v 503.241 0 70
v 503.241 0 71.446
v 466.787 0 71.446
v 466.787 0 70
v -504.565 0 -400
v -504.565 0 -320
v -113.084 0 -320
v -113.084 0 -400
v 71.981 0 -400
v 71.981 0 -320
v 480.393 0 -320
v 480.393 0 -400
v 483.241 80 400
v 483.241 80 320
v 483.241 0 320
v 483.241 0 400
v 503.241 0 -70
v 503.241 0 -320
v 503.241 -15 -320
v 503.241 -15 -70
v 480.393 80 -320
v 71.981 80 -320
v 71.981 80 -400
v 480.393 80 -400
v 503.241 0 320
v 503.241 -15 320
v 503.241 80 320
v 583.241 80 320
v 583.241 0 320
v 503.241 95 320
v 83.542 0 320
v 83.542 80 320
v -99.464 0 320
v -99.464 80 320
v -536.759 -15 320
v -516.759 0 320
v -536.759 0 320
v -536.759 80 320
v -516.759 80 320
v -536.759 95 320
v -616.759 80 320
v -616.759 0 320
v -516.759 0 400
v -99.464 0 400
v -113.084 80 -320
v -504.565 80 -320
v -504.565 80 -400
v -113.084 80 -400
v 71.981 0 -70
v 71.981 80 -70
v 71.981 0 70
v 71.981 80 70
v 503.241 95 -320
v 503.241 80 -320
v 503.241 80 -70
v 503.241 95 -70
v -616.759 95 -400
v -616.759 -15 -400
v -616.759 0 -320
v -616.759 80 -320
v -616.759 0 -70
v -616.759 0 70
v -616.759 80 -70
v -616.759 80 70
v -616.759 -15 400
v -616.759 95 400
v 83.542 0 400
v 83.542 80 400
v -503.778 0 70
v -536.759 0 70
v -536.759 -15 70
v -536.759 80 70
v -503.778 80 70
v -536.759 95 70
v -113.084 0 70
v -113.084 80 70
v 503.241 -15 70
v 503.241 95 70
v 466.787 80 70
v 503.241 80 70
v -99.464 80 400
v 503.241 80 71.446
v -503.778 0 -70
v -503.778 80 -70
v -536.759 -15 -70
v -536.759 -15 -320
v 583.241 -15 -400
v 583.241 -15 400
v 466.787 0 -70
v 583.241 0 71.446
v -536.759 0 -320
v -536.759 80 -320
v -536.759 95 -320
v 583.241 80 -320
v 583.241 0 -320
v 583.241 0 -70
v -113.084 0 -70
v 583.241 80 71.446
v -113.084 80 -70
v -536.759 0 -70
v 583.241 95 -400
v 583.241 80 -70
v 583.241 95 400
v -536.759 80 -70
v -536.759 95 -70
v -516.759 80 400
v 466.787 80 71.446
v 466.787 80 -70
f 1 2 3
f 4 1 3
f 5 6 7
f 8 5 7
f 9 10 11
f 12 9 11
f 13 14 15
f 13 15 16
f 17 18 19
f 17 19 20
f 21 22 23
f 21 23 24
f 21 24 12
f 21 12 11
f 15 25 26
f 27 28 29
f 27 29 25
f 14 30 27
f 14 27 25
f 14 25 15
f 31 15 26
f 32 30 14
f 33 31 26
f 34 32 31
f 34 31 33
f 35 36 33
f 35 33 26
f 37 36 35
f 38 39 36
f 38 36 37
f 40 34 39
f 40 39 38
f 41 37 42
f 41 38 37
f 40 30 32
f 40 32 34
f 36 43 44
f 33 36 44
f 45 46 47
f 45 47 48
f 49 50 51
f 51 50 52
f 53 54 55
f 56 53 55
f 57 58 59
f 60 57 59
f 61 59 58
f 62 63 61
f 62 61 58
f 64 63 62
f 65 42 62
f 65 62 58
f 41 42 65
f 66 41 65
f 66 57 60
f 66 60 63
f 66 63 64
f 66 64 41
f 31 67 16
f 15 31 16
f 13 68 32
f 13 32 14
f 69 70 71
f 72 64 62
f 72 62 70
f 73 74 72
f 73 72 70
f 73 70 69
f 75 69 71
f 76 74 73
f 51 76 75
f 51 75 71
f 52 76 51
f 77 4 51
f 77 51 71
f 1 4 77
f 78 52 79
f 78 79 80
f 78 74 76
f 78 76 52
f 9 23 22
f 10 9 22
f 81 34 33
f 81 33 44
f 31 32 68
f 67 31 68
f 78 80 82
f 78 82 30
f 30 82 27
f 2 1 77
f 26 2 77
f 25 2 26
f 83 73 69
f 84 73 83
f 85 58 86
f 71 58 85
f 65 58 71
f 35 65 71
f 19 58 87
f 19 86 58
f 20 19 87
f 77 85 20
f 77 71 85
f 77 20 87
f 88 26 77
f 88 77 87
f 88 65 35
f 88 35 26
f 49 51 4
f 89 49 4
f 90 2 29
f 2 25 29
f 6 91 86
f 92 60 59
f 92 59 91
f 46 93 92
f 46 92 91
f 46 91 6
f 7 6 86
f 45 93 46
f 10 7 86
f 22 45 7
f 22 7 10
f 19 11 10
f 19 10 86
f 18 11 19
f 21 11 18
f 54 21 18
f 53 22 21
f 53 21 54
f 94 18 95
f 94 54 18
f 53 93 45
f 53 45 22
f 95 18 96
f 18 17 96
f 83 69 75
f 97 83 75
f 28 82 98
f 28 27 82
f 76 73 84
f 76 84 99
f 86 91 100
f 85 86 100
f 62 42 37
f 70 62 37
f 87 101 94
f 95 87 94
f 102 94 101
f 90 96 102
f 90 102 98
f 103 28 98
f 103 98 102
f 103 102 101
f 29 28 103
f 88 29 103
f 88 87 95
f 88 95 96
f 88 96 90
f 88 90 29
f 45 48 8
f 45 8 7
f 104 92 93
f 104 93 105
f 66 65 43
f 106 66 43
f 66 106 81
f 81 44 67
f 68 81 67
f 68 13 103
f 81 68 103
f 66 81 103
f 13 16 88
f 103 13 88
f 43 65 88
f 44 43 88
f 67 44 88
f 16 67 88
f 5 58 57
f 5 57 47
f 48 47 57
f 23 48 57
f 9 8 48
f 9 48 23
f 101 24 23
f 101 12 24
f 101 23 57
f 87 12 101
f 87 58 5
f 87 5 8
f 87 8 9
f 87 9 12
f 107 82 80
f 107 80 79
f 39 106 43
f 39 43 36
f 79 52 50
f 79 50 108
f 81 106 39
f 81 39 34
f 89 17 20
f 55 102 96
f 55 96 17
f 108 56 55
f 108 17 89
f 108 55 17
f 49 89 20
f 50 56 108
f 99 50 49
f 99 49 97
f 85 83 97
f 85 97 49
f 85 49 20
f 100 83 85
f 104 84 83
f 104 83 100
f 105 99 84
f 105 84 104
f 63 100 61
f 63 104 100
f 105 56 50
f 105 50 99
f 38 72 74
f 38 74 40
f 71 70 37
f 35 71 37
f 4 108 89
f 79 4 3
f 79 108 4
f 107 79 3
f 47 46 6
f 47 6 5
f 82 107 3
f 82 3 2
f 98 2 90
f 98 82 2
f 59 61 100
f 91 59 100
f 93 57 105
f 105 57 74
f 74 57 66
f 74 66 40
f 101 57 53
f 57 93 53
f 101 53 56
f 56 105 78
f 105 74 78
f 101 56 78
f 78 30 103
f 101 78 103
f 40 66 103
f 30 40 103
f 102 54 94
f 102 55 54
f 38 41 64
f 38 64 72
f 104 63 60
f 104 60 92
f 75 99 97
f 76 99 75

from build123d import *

# Parameters (mm, degrees)
F0_W     = 1200
F0_H     = 800
F0_W_2   = 1040
F0_H_2   = 250
F1_DEPTH = 15
F2_W     = 185.065291822
F2_H     = 140
F3_DEPTH = 40
F2_W_2   = 100
F2_H_2   = 80
F2_W_3   = 116.4537014898
F2_H_3   = 141.4459940791
F2_W_4   = 112.9816351
F2_W_5   = 102.8472425875
F2_W_6   = 112.1940789286
F2_W_7   = 183.0065995455
F4_DEPTH = 40


with BuildPart() as f1:
    # F0 (on Front) → F1 (new body)
    with BuildSketch(Plane.XZ):
        with Locations((-16.7594370905, 0)):
            Rectangle(F0_W, F0_H)
        with Locations((-16.7594370905, -195)):
            Rectangle(F0_W_2, F0_H_2, mode=Mode.SUBTRACT)
        with Locations((-16.7594370905, 195)):
            Rectangle(F0_W_2, F0_H_2, mode=Mode.SUBTRACT)
    extrude(amount=F1_DEPTH)

    # F2 (on face) → F3 (join)
    with BuildSketch(Plane(origin=(0, 0, 0), x_dir=(-1, 0, 0), z_dir=(0, 1, 0))):
        with Locations((20.5517672002, 0)):
            Rectangle(F2_W, F2_H)
        Polygon((616.7594370905, -70), (616.7594370905, 70), (536.7594370905, 70), (503.7778019905, 70), (503.7778019905, -70), (536.7594370905, -70), align=None)
        Polygon((616.7594370905, -400), (616.7594370905, -320), (536.7594370905, -320), (504.5653581619, -320), (504.5653581619, -400), align=None)
        Polygon((-503.2405629095, -320), (-583.2405629095, -320), (-583.2405629095, -400), (-480.393320322, -400), (-480.393320322, -320), align=None)
        Polygon((-503.2405629095, 70), (-503.2405629095, 71.4459940791), (-583.2405629095, 71.4459940791), (-583.2405629095, -70), (-503.2405629095, -70), (-466.7868614197, -70), (-466.7868614197, 70), align=None)
        Polygon((-483.2405629095, 320), (-483.2405629095, 400), (-583.2405629095, 400), (-583.2405629095, 320), (-503.2405629095, 320), align=None)
        Polygon((616.7594370905, 400), (516.7594370905, 400), (516.7594370905, 320), (536.7594370905, 320), (616.7594370905, 320), align=None)
    extrude(amount=F3_DEPTH)

    # F2 (on face) → F4 (join)
    with BuildSketch(Plane(origin=(0, 0, 0), x_dir=(-1, 0, 0), z_dir=(0, 1, 0))):
        with Locations((566.7594370905, 360)):
            Rectangle(F2_W_2, F2_H_2)
        with Locations((-533.2405629095, 360)):
            Rectangle(F2_W_2, F2_H_2)
        with Locations((-525.0137121646, 0.7229970396)):
            Rectangle(F2_W_3, F2_H_3)
        with Locations((560.2686195405, 0)):
            Rectangle(F2_W_4, F2_H)
        with Locations((20.5517672002, 0)):
            Rectangle(F2_W, F2_H)
        with Locations((-531.8169416158, -360)):
            Rectangle(F2_W_5, F2_H_2)
        with Locations((560.6623976262, -360)):
            Rectangle(F2_W_6, F2_H_2)
        with Locations((7.9610347748, 360)):
            Rectangle(F2_W_7, F2_H_2)
        with Locations((20.5517672002, -360)):
            Rectangle(F2_W, F2_H_2)
    extrude(amount=F4_DEPTH)

    # F5: F1 across face


with BuildPart() as f1_1:
    add(f1.part)
    add(f1.part.mirror(Plane(origin=(-20.5517672002, 40, 0), x_dir=(-1, 0, 0), z_dir=(0, 1, 0))))


solid = f1_1.part
